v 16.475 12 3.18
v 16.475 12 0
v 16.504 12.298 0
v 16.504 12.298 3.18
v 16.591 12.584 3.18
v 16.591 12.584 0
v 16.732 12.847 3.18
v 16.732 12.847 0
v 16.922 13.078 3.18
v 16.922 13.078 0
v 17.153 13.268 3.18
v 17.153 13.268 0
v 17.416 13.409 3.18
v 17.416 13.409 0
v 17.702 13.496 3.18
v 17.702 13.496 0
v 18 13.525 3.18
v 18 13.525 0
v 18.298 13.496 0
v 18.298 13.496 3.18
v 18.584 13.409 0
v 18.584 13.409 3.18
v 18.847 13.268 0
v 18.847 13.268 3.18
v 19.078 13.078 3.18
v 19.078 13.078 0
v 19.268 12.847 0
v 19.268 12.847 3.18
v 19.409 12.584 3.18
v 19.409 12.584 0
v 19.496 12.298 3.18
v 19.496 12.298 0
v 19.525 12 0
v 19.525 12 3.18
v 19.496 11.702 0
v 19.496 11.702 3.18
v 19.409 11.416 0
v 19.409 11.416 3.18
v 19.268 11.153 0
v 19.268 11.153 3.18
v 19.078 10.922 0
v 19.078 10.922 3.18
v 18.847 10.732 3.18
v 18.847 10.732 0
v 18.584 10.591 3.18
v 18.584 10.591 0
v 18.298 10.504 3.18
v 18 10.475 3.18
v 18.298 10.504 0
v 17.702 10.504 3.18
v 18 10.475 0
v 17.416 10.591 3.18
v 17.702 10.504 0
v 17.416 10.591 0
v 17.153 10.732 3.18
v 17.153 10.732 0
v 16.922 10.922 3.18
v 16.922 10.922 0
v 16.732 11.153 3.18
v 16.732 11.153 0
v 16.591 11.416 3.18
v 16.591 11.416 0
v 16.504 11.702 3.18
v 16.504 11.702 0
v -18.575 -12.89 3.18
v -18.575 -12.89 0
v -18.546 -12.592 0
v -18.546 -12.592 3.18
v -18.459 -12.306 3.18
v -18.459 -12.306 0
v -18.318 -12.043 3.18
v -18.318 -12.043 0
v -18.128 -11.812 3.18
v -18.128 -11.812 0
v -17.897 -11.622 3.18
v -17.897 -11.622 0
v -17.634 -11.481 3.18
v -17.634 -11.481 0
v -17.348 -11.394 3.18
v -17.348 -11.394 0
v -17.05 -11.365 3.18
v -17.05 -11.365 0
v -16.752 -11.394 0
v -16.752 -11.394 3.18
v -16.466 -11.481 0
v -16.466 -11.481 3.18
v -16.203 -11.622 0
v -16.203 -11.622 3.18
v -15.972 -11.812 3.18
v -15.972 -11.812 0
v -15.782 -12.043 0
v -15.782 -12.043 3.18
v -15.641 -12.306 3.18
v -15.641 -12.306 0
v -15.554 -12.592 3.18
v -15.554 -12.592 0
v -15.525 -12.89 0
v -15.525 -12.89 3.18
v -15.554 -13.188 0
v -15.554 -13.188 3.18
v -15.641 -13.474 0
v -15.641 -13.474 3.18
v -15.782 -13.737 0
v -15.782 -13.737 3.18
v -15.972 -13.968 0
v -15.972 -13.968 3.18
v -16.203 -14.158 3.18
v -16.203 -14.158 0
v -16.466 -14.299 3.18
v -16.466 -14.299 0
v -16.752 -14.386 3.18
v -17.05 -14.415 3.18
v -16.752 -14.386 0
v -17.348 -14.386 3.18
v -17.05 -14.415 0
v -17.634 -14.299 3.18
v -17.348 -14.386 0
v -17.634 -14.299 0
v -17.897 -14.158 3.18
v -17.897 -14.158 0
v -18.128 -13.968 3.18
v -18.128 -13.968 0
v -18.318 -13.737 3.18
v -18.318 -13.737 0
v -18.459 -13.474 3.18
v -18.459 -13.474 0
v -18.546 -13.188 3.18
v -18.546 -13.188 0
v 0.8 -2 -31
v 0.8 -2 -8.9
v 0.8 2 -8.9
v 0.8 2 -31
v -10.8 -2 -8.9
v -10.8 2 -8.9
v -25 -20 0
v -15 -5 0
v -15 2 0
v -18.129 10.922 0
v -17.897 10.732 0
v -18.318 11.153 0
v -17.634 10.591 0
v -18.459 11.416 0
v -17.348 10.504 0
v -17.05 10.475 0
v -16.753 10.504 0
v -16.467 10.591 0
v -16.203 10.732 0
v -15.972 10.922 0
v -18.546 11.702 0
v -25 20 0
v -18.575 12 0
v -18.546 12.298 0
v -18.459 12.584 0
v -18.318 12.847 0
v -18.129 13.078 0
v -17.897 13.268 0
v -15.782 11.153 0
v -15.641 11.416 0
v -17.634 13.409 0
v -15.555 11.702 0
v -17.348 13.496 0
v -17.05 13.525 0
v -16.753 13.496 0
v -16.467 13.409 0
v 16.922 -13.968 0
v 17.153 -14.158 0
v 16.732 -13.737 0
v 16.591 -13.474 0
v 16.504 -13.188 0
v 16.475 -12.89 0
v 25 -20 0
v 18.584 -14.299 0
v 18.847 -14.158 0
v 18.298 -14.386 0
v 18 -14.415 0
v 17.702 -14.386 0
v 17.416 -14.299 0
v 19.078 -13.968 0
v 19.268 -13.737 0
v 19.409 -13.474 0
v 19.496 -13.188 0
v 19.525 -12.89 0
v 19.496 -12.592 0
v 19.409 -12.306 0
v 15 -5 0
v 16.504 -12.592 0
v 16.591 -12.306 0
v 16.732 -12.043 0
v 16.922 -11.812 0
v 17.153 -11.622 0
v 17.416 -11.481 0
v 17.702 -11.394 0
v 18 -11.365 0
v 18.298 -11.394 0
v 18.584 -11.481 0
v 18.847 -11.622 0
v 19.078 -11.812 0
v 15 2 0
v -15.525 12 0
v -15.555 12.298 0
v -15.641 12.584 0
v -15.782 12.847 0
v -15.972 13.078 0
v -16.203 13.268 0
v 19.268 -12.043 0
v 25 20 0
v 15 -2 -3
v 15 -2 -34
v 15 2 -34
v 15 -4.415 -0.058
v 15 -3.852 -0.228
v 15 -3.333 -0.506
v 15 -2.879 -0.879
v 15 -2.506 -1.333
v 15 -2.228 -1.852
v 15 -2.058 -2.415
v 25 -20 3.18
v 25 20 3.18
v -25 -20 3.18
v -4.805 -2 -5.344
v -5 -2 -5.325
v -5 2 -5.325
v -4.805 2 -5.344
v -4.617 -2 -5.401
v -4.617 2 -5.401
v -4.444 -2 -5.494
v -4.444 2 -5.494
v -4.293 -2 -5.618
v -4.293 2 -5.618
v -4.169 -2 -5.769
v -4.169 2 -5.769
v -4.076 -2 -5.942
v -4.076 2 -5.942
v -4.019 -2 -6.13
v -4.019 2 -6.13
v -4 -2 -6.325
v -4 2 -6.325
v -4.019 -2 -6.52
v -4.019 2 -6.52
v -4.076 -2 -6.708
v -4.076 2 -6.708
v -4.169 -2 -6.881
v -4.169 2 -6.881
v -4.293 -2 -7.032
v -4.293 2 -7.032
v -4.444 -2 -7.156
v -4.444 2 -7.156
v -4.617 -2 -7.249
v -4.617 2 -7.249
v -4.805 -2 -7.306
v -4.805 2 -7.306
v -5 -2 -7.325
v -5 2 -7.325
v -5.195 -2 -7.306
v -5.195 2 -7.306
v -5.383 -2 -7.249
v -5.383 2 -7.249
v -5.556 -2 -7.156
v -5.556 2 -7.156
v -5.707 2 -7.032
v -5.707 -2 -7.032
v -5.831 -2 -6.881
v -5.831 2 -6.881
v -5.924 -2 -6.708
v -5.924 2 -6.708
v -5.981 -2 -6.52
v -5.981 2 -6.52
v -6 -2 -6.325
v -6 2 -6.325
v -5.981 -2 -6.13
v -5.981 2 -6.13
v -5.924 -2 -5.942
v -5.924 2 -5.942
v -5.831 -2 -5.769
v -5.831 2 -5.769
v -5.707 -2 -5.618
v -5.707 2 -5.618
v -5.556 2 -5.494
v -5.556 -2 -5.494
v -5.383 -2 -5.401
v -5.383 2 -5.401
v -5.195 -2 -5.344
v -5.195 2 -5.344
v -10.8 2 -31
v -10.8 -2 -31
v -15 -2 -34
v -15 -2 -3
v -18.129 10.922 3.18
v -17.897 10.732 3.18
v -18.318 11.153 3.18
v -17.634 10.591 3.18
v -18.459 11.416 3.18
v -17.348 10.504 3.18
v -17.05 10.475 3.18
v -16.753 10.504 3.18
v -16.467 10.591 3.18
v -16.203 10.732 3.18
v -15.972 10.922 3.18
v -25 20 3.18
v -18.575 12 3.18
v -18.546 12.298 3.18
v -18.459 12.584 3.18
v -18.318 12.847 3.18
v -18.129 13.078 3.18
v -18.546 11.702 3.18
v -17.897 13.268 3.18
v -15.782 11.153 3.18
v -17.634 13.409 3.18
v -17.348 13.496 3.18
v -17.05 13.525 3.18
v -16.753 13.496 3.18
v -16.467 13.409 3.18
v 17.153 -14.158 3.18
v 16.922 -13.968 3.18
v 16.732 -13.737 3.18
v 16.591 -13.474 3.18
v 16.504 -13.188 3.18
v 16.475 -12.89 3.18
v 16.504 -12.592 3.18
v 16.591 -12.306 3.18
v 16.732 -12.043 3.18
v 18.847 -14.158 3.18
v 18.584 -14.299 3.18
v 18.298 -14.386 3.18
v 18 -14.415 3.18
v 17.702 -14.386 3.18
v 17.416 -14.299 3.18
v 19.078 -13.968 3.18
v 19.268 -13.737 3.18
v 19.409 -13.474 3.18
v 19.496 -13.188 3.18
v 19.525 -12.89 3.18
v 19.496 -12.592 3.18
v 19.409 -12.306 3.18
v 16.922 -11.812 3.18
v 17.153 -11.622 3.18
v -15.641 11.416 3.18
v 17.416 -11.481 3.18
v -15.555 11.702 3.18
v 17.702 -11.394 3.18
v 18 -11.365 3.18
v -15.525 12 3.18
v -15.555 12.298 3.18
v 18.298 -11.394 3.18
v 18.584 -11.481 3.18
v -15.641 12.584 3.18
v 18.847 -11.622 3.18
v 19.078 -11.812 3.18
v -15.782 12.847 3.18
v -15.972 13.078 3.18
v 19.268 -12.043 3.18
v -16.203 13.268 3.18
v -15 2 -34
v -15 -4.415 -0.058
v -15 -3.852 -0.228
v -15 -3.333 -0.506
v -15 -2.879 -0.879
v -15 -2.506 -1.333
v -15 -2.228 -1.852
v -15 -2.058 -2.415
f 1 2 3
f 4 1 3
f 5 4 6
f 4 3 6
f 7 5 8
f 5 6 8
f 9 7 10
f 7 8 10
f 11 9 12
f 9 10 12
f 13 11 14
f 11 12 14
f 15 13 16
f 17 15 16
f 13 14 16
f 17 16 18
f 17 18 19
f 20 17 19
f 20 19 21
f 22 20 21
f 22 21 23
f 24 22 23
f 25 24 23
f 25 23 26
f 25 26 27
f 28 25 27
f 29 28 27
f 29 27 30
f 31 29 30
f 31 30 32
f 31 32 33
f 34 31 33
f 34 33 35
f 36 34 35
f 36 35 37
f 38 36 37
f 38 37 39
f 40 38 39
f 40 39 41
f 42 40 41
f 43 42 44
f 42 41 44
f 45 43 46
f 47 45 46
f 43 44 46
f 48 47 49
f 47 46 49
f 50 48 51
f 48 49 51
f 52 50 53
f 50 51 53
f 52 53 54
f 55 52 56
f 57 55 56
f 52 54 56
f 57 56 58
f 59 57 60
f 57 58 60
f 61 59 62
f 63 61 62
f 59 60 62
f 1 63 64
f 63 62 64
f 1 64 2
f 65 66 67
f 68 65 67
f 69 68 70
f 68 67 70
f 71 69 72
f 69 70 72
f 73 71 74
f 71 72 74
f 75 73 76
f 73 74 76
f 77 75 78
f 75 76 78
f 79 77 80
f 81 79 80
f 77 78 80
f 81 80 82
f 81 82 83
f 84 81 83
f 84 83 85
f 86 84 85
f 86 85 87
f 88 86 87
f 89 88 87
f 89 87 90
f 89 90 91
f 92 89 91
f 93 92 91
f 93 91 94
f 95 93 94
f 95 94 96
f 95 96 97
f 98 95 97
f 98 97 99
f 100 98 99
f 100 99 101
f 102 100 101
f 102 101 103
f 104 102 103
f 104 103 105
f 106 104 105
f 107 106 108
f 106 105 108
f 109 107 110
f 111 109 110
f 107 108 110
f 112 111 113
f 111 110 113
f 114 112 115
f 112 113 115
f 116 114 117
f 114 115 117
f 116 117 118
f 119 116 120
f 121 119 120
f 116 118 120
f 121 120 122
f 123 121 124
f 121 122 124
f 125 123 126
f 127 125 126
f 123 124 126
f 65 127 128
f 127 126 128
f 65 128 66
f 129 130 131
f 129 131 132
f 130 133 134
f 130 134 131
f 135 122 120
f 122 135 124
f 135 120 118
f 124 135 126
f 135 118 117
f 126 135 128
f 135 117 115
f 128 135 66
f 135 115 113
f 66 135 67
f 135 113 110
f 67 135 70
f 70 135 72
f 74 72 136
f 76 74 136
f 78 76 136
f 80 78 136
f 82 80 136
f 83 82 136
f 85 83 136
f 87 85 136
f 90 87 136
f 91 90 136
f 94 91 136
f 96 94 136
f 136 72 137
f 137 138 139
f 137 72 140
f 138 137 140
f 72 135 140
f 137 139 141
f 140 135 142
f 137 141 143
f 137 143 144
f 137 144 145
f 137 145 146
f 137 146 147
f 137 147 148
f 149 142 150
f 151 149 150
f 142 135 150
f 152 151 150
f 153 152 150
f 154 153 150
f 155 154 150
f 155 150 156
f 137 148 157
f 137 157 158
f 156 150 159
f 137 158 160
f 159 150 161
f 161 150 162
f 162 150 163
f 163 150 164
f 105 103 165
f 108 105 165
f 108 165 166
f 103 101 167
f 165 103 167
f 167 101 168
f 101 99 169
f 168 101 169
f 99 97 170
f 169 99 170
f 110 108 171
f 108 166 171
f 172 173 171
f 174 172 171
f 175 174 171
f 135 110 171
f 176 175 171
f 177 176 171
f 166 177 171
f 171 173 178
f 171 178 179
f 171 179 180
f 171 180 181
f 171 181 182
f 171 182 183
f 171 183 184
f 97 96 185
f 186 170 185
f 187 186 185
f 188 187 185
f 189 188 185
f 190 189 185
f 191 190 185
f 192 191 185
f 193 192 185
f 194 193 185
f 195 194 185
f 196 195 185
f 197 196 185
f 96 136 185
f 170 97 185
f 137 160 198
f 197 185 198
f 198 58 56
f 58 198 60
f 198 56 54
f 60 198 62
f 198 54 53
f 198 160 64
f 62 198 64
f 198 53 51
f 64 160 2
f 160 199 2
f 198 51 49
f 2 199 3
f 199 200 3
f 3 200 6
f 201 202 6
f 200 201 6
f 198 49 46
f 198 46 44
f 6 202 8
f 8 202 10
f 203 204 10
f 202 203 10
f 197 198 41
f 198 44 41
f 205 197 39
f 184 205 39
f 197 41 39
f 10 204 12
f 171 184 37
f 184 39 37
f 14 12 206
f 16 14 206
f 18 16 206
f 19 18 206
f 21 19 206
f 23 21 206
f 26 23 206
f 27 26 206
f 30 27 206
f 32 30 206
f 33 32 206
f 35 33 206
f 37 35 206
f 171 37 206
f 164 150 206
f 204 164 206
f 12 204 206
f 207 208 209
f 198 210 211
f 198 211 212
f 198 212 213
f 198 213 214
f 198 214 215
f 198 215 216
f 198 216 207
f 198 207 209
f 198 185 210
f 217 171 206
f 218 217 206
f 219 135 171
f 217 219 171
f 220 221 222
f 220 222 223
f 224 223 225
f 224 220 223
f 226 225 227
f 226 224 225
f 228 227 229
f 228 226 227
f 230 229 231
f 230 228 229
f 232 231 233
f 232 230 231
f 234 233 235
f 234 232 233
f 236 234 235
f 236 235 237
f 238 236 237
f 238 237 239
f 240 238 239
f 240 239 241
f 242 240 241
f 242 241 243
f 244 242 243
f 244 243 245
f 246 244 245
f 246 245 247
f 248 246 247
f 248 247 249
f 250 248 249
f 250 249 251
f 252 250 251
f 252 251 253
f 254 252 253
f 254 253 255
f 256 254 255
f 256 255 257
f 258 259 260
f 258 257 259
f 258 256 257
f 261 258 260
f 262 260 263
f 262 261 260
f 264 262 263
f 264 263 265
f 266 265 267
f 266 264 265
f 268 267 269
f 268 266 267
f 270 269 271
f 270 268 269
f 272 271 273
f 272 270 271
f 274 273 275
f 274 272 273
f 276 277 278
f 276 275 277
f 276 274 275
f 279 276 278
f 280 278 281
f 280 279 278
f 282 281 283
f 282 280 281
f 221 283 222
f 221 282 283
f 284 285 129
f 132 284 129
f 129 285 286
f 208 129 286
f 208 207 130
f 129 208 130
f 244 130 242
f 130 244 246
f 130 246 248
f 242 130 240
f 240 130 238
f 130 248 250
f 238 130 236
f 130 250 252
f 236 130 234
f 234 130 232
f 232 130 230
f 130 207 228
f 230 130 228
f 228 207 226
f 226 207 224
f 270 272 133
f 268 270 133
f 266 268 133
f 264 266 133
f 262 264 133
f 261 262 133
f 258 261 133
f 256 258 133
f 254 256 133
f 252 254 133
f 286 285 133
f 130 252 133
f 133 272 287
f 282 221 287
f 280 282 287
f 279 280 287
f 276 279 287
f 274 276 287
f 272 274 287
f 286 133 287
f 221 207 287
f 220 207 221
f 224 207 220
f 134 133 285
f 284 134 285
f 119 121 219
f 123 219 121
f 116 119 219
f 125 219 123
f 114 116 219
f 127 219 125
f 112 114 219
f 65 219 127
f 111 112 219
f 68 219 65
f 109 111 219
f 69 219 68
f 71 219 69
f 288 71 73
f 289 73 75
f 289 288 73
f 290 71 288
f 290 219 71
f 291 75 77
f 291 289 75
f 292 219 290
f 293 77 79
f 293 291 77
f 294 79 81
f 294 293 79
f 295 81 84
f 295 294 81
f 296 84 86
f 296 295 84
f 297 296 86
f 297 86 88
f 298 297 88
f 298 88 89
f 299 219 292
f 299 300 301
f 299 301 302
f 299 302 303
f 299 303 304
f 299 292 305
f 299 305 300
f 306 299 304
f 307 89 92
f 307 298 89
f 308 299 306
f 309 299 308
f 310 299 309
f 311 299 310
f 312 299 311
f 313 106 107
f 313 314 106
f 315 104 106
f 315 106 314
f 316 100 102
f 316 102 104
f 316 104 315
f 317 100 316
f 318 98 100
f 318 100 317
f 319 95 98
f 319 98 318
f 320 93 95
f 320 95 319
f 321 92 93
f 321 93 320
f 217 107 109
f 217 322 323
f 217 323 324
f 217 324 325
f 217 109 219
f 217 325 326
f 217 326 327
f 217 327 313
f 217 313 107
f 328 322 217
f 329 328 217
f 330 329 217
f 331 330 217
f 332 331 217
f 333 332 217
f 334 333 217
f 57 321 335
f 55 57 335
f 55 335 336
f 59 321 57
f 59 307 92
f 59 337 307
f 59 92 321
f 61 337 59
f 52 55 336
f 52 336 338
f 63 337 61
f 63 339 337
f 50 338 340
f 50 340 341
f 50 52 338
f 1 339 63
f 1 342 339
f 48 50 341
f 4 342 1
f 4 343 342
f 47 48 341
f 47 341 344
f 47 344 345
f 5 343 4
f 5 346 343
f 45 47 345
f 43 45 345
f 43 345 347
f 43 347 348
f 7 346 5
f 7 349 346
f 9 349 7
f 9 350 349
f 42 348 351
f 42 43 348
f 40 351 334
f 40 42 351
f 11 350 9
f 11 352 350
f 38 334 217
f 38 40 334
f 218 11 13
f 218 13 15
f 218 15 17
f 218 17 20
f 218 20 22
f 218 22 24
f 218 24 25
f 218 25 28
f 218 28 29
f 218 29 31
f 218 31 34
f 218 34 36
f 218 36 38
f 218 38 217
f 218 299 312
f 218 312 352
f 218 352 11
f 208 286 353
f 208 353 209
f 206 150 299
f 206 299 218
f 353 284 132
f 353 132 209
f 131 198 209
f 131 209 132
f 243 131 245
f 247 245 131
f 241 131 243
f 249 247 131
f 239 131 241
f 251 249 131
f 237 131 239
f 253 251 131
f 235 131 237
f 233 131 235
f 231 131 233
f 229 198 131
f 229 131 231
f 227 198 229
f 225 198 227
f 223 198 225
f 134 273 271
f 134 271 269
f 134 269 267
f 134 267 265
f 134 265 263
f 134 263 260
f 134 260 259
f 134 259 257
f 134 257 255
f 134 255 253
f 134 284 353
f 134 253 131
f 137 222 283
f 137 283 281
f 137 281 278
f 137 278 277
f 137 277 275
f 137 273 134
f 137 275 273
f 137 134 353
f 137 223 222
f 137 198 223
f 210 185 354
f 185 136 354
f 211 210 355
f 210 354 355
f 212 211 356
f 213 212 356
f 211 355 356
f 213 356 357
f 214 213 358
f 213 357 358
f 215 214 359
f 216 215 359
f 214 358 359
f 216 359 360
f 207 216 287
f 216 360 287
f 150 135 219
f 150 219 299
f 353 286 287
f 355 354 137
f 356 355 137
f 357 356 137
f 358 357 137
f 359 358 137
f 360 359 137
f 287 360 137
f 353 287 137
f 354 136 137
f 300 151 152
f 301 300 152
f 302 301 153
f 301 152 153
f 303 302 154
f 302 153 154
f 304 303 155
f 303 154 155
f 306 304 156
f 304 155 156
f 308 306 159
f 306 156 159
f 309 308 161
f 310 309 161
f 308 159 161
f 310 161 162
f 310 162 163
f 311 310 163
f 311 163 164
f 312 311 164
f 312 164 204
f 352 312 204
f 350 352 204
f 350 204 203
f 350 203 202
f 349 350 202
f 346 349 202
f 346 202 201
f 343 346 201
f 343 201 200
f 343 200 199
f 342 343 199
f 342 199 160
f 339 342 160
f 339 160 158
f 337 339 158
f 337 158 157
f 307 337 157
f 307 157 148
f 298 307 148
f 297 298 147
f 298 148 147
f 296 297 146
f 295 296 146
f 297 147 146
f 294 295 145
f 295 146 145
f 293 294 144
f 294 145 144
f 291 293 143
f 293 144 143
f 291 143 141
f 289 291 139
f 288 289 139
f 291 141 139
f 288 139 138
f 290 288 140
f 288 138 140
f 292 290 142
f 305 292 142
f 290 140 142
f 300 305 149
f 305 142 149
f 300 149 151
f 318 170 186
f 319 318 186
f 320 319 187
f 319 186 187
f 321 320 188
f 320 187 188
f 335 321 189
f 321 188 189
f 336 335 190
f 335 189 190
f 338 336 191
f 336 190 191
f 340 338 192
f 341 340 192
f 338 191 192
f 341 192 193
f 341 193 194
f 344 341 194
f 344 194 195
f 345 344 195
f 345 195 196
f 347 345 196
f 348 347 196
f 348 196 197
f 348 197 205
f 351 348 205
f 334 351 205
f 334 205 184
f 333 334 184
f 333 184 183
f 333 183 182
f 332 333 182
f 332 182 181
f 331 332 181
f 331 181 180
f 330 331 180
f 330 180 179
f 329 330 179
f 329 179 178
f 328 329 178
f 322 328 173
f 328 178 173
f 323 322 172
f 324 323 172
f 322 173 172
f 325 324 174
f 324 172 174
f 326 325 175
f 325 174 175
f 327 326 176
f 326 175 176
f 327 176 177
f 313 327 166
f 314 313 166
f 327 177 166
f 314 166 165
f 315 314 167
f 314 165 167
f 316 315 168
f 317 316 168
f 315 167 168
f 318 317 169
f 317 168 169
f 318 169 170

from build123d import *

# Parameters (mm, degrees)
SKETCH1_W               = 50
SKETCH1_H               = 40
BOSS_EXTRUDE1_DEPTH     = 3.18
SKETCH4_W               = 30
SKETCH4_H               = 4
BOSS_EXTRUDE2_DEPTH     = 36
CUT_EXTRUDE1_DEPTH      = 50.040799341
CUT_EXTRUDE1_DEPTH_BACK = 50.040799341
SKETCH8_W               = 11.6
SKETCH8_H               = 22.1
SKETCH8_R               = 1
SKETCH9_R               = 1.525
CUT_EXTRUDE2_DEPTH      = 49.176757882
FILLET4_R               = 3
SKETCH12_W              = 30
SKETCH12_H              = 2
CUT_EXTRUDE3_DEPTH      = 50.040799341


with BuildPart() as part:
    # Sketch1 → Boss-Extrude1 (new body)
    with BuildSketch(Plane.XY):
        Rectangle(SKETCH1_W, SKETCH1_H)
    extrude(amount=BOSS_EXTRUDE1_DEPTH)

    # Sketch4 → Boss-Extrude2 (add)
    with BuildSketch(Plane(origin=(0, 0, 0), x_dir=(-1, 0, 0), z_dir=(0, 0, -1))):
        Rectangle(SKETCH4_W, SKETCH4_H)
    extrude(amount=BOSS_EXTRUDE2_DEPTH)

    # Sketch8 → Cut-Extrude1 (cut, two sides: drawn at the far end of the back side and taken through both)
    with BuildSketch(Plane(origin=(0, 2, 0), x_dir=(1, 0, 0), z_dir=(0, 1, 0)).offset(-CUT_EXTRUDE1_DEPTH_BACK)):
        with Locations((-5, 19.95)):
            Rectangle(SKETCH8_W, SKETCH8_H)
        with Locations((-5, 6.325)):
            Circle(SKETCH8_R)
    extrude(amount=CUT_EXTRUDE1_DEPTH + CUT_EXTRUDE1_DEPTH_BACK, mode=Mode.SUBTRACT)

    # Sketch9 → Cut-Extrude2 (cut, through all)
    with BuildSketch(Plane(origin=(0, 0, 0), x_dir=(-1, 0, 0), z_dir=(0, 0, -1))):
        with Locations((-18, 12)):
            Circle(SKETCH9_R)
        with Locations((17.0502, 12)):
            Circle(SKETCH9_R)
        with Locations((17.05, -12.889999999)):
            Circle(SKETCH9_R)
        with Locations((-18, -12.889999999)):
            Circle(SKETCH9_R)
    extrude(amount=-CUT_EXTRUDE2_DEPTH, mode=Mode.SUBTRACT)

    # Fillet4
    fillet4_edges = [part.edges().sort_by_distance(p)[0] for p in [
        (0, -2, 0),
    ]]
    fillet(fillet4_edges, radius=FILLET4_R)

    # Sketch12 → Cut-Extrude3 (cut, through all)
    with BuildSketch(Plane.XZ.offset(2)):
        with Locations((0, -35)):
            Rectangle(SKETCH12_W, SKETCH12_H)
    extrude(amount=-CUT_EXTRUDE3_DEPTH, mode=Mode.SUBTRACT)


solid = part.part
